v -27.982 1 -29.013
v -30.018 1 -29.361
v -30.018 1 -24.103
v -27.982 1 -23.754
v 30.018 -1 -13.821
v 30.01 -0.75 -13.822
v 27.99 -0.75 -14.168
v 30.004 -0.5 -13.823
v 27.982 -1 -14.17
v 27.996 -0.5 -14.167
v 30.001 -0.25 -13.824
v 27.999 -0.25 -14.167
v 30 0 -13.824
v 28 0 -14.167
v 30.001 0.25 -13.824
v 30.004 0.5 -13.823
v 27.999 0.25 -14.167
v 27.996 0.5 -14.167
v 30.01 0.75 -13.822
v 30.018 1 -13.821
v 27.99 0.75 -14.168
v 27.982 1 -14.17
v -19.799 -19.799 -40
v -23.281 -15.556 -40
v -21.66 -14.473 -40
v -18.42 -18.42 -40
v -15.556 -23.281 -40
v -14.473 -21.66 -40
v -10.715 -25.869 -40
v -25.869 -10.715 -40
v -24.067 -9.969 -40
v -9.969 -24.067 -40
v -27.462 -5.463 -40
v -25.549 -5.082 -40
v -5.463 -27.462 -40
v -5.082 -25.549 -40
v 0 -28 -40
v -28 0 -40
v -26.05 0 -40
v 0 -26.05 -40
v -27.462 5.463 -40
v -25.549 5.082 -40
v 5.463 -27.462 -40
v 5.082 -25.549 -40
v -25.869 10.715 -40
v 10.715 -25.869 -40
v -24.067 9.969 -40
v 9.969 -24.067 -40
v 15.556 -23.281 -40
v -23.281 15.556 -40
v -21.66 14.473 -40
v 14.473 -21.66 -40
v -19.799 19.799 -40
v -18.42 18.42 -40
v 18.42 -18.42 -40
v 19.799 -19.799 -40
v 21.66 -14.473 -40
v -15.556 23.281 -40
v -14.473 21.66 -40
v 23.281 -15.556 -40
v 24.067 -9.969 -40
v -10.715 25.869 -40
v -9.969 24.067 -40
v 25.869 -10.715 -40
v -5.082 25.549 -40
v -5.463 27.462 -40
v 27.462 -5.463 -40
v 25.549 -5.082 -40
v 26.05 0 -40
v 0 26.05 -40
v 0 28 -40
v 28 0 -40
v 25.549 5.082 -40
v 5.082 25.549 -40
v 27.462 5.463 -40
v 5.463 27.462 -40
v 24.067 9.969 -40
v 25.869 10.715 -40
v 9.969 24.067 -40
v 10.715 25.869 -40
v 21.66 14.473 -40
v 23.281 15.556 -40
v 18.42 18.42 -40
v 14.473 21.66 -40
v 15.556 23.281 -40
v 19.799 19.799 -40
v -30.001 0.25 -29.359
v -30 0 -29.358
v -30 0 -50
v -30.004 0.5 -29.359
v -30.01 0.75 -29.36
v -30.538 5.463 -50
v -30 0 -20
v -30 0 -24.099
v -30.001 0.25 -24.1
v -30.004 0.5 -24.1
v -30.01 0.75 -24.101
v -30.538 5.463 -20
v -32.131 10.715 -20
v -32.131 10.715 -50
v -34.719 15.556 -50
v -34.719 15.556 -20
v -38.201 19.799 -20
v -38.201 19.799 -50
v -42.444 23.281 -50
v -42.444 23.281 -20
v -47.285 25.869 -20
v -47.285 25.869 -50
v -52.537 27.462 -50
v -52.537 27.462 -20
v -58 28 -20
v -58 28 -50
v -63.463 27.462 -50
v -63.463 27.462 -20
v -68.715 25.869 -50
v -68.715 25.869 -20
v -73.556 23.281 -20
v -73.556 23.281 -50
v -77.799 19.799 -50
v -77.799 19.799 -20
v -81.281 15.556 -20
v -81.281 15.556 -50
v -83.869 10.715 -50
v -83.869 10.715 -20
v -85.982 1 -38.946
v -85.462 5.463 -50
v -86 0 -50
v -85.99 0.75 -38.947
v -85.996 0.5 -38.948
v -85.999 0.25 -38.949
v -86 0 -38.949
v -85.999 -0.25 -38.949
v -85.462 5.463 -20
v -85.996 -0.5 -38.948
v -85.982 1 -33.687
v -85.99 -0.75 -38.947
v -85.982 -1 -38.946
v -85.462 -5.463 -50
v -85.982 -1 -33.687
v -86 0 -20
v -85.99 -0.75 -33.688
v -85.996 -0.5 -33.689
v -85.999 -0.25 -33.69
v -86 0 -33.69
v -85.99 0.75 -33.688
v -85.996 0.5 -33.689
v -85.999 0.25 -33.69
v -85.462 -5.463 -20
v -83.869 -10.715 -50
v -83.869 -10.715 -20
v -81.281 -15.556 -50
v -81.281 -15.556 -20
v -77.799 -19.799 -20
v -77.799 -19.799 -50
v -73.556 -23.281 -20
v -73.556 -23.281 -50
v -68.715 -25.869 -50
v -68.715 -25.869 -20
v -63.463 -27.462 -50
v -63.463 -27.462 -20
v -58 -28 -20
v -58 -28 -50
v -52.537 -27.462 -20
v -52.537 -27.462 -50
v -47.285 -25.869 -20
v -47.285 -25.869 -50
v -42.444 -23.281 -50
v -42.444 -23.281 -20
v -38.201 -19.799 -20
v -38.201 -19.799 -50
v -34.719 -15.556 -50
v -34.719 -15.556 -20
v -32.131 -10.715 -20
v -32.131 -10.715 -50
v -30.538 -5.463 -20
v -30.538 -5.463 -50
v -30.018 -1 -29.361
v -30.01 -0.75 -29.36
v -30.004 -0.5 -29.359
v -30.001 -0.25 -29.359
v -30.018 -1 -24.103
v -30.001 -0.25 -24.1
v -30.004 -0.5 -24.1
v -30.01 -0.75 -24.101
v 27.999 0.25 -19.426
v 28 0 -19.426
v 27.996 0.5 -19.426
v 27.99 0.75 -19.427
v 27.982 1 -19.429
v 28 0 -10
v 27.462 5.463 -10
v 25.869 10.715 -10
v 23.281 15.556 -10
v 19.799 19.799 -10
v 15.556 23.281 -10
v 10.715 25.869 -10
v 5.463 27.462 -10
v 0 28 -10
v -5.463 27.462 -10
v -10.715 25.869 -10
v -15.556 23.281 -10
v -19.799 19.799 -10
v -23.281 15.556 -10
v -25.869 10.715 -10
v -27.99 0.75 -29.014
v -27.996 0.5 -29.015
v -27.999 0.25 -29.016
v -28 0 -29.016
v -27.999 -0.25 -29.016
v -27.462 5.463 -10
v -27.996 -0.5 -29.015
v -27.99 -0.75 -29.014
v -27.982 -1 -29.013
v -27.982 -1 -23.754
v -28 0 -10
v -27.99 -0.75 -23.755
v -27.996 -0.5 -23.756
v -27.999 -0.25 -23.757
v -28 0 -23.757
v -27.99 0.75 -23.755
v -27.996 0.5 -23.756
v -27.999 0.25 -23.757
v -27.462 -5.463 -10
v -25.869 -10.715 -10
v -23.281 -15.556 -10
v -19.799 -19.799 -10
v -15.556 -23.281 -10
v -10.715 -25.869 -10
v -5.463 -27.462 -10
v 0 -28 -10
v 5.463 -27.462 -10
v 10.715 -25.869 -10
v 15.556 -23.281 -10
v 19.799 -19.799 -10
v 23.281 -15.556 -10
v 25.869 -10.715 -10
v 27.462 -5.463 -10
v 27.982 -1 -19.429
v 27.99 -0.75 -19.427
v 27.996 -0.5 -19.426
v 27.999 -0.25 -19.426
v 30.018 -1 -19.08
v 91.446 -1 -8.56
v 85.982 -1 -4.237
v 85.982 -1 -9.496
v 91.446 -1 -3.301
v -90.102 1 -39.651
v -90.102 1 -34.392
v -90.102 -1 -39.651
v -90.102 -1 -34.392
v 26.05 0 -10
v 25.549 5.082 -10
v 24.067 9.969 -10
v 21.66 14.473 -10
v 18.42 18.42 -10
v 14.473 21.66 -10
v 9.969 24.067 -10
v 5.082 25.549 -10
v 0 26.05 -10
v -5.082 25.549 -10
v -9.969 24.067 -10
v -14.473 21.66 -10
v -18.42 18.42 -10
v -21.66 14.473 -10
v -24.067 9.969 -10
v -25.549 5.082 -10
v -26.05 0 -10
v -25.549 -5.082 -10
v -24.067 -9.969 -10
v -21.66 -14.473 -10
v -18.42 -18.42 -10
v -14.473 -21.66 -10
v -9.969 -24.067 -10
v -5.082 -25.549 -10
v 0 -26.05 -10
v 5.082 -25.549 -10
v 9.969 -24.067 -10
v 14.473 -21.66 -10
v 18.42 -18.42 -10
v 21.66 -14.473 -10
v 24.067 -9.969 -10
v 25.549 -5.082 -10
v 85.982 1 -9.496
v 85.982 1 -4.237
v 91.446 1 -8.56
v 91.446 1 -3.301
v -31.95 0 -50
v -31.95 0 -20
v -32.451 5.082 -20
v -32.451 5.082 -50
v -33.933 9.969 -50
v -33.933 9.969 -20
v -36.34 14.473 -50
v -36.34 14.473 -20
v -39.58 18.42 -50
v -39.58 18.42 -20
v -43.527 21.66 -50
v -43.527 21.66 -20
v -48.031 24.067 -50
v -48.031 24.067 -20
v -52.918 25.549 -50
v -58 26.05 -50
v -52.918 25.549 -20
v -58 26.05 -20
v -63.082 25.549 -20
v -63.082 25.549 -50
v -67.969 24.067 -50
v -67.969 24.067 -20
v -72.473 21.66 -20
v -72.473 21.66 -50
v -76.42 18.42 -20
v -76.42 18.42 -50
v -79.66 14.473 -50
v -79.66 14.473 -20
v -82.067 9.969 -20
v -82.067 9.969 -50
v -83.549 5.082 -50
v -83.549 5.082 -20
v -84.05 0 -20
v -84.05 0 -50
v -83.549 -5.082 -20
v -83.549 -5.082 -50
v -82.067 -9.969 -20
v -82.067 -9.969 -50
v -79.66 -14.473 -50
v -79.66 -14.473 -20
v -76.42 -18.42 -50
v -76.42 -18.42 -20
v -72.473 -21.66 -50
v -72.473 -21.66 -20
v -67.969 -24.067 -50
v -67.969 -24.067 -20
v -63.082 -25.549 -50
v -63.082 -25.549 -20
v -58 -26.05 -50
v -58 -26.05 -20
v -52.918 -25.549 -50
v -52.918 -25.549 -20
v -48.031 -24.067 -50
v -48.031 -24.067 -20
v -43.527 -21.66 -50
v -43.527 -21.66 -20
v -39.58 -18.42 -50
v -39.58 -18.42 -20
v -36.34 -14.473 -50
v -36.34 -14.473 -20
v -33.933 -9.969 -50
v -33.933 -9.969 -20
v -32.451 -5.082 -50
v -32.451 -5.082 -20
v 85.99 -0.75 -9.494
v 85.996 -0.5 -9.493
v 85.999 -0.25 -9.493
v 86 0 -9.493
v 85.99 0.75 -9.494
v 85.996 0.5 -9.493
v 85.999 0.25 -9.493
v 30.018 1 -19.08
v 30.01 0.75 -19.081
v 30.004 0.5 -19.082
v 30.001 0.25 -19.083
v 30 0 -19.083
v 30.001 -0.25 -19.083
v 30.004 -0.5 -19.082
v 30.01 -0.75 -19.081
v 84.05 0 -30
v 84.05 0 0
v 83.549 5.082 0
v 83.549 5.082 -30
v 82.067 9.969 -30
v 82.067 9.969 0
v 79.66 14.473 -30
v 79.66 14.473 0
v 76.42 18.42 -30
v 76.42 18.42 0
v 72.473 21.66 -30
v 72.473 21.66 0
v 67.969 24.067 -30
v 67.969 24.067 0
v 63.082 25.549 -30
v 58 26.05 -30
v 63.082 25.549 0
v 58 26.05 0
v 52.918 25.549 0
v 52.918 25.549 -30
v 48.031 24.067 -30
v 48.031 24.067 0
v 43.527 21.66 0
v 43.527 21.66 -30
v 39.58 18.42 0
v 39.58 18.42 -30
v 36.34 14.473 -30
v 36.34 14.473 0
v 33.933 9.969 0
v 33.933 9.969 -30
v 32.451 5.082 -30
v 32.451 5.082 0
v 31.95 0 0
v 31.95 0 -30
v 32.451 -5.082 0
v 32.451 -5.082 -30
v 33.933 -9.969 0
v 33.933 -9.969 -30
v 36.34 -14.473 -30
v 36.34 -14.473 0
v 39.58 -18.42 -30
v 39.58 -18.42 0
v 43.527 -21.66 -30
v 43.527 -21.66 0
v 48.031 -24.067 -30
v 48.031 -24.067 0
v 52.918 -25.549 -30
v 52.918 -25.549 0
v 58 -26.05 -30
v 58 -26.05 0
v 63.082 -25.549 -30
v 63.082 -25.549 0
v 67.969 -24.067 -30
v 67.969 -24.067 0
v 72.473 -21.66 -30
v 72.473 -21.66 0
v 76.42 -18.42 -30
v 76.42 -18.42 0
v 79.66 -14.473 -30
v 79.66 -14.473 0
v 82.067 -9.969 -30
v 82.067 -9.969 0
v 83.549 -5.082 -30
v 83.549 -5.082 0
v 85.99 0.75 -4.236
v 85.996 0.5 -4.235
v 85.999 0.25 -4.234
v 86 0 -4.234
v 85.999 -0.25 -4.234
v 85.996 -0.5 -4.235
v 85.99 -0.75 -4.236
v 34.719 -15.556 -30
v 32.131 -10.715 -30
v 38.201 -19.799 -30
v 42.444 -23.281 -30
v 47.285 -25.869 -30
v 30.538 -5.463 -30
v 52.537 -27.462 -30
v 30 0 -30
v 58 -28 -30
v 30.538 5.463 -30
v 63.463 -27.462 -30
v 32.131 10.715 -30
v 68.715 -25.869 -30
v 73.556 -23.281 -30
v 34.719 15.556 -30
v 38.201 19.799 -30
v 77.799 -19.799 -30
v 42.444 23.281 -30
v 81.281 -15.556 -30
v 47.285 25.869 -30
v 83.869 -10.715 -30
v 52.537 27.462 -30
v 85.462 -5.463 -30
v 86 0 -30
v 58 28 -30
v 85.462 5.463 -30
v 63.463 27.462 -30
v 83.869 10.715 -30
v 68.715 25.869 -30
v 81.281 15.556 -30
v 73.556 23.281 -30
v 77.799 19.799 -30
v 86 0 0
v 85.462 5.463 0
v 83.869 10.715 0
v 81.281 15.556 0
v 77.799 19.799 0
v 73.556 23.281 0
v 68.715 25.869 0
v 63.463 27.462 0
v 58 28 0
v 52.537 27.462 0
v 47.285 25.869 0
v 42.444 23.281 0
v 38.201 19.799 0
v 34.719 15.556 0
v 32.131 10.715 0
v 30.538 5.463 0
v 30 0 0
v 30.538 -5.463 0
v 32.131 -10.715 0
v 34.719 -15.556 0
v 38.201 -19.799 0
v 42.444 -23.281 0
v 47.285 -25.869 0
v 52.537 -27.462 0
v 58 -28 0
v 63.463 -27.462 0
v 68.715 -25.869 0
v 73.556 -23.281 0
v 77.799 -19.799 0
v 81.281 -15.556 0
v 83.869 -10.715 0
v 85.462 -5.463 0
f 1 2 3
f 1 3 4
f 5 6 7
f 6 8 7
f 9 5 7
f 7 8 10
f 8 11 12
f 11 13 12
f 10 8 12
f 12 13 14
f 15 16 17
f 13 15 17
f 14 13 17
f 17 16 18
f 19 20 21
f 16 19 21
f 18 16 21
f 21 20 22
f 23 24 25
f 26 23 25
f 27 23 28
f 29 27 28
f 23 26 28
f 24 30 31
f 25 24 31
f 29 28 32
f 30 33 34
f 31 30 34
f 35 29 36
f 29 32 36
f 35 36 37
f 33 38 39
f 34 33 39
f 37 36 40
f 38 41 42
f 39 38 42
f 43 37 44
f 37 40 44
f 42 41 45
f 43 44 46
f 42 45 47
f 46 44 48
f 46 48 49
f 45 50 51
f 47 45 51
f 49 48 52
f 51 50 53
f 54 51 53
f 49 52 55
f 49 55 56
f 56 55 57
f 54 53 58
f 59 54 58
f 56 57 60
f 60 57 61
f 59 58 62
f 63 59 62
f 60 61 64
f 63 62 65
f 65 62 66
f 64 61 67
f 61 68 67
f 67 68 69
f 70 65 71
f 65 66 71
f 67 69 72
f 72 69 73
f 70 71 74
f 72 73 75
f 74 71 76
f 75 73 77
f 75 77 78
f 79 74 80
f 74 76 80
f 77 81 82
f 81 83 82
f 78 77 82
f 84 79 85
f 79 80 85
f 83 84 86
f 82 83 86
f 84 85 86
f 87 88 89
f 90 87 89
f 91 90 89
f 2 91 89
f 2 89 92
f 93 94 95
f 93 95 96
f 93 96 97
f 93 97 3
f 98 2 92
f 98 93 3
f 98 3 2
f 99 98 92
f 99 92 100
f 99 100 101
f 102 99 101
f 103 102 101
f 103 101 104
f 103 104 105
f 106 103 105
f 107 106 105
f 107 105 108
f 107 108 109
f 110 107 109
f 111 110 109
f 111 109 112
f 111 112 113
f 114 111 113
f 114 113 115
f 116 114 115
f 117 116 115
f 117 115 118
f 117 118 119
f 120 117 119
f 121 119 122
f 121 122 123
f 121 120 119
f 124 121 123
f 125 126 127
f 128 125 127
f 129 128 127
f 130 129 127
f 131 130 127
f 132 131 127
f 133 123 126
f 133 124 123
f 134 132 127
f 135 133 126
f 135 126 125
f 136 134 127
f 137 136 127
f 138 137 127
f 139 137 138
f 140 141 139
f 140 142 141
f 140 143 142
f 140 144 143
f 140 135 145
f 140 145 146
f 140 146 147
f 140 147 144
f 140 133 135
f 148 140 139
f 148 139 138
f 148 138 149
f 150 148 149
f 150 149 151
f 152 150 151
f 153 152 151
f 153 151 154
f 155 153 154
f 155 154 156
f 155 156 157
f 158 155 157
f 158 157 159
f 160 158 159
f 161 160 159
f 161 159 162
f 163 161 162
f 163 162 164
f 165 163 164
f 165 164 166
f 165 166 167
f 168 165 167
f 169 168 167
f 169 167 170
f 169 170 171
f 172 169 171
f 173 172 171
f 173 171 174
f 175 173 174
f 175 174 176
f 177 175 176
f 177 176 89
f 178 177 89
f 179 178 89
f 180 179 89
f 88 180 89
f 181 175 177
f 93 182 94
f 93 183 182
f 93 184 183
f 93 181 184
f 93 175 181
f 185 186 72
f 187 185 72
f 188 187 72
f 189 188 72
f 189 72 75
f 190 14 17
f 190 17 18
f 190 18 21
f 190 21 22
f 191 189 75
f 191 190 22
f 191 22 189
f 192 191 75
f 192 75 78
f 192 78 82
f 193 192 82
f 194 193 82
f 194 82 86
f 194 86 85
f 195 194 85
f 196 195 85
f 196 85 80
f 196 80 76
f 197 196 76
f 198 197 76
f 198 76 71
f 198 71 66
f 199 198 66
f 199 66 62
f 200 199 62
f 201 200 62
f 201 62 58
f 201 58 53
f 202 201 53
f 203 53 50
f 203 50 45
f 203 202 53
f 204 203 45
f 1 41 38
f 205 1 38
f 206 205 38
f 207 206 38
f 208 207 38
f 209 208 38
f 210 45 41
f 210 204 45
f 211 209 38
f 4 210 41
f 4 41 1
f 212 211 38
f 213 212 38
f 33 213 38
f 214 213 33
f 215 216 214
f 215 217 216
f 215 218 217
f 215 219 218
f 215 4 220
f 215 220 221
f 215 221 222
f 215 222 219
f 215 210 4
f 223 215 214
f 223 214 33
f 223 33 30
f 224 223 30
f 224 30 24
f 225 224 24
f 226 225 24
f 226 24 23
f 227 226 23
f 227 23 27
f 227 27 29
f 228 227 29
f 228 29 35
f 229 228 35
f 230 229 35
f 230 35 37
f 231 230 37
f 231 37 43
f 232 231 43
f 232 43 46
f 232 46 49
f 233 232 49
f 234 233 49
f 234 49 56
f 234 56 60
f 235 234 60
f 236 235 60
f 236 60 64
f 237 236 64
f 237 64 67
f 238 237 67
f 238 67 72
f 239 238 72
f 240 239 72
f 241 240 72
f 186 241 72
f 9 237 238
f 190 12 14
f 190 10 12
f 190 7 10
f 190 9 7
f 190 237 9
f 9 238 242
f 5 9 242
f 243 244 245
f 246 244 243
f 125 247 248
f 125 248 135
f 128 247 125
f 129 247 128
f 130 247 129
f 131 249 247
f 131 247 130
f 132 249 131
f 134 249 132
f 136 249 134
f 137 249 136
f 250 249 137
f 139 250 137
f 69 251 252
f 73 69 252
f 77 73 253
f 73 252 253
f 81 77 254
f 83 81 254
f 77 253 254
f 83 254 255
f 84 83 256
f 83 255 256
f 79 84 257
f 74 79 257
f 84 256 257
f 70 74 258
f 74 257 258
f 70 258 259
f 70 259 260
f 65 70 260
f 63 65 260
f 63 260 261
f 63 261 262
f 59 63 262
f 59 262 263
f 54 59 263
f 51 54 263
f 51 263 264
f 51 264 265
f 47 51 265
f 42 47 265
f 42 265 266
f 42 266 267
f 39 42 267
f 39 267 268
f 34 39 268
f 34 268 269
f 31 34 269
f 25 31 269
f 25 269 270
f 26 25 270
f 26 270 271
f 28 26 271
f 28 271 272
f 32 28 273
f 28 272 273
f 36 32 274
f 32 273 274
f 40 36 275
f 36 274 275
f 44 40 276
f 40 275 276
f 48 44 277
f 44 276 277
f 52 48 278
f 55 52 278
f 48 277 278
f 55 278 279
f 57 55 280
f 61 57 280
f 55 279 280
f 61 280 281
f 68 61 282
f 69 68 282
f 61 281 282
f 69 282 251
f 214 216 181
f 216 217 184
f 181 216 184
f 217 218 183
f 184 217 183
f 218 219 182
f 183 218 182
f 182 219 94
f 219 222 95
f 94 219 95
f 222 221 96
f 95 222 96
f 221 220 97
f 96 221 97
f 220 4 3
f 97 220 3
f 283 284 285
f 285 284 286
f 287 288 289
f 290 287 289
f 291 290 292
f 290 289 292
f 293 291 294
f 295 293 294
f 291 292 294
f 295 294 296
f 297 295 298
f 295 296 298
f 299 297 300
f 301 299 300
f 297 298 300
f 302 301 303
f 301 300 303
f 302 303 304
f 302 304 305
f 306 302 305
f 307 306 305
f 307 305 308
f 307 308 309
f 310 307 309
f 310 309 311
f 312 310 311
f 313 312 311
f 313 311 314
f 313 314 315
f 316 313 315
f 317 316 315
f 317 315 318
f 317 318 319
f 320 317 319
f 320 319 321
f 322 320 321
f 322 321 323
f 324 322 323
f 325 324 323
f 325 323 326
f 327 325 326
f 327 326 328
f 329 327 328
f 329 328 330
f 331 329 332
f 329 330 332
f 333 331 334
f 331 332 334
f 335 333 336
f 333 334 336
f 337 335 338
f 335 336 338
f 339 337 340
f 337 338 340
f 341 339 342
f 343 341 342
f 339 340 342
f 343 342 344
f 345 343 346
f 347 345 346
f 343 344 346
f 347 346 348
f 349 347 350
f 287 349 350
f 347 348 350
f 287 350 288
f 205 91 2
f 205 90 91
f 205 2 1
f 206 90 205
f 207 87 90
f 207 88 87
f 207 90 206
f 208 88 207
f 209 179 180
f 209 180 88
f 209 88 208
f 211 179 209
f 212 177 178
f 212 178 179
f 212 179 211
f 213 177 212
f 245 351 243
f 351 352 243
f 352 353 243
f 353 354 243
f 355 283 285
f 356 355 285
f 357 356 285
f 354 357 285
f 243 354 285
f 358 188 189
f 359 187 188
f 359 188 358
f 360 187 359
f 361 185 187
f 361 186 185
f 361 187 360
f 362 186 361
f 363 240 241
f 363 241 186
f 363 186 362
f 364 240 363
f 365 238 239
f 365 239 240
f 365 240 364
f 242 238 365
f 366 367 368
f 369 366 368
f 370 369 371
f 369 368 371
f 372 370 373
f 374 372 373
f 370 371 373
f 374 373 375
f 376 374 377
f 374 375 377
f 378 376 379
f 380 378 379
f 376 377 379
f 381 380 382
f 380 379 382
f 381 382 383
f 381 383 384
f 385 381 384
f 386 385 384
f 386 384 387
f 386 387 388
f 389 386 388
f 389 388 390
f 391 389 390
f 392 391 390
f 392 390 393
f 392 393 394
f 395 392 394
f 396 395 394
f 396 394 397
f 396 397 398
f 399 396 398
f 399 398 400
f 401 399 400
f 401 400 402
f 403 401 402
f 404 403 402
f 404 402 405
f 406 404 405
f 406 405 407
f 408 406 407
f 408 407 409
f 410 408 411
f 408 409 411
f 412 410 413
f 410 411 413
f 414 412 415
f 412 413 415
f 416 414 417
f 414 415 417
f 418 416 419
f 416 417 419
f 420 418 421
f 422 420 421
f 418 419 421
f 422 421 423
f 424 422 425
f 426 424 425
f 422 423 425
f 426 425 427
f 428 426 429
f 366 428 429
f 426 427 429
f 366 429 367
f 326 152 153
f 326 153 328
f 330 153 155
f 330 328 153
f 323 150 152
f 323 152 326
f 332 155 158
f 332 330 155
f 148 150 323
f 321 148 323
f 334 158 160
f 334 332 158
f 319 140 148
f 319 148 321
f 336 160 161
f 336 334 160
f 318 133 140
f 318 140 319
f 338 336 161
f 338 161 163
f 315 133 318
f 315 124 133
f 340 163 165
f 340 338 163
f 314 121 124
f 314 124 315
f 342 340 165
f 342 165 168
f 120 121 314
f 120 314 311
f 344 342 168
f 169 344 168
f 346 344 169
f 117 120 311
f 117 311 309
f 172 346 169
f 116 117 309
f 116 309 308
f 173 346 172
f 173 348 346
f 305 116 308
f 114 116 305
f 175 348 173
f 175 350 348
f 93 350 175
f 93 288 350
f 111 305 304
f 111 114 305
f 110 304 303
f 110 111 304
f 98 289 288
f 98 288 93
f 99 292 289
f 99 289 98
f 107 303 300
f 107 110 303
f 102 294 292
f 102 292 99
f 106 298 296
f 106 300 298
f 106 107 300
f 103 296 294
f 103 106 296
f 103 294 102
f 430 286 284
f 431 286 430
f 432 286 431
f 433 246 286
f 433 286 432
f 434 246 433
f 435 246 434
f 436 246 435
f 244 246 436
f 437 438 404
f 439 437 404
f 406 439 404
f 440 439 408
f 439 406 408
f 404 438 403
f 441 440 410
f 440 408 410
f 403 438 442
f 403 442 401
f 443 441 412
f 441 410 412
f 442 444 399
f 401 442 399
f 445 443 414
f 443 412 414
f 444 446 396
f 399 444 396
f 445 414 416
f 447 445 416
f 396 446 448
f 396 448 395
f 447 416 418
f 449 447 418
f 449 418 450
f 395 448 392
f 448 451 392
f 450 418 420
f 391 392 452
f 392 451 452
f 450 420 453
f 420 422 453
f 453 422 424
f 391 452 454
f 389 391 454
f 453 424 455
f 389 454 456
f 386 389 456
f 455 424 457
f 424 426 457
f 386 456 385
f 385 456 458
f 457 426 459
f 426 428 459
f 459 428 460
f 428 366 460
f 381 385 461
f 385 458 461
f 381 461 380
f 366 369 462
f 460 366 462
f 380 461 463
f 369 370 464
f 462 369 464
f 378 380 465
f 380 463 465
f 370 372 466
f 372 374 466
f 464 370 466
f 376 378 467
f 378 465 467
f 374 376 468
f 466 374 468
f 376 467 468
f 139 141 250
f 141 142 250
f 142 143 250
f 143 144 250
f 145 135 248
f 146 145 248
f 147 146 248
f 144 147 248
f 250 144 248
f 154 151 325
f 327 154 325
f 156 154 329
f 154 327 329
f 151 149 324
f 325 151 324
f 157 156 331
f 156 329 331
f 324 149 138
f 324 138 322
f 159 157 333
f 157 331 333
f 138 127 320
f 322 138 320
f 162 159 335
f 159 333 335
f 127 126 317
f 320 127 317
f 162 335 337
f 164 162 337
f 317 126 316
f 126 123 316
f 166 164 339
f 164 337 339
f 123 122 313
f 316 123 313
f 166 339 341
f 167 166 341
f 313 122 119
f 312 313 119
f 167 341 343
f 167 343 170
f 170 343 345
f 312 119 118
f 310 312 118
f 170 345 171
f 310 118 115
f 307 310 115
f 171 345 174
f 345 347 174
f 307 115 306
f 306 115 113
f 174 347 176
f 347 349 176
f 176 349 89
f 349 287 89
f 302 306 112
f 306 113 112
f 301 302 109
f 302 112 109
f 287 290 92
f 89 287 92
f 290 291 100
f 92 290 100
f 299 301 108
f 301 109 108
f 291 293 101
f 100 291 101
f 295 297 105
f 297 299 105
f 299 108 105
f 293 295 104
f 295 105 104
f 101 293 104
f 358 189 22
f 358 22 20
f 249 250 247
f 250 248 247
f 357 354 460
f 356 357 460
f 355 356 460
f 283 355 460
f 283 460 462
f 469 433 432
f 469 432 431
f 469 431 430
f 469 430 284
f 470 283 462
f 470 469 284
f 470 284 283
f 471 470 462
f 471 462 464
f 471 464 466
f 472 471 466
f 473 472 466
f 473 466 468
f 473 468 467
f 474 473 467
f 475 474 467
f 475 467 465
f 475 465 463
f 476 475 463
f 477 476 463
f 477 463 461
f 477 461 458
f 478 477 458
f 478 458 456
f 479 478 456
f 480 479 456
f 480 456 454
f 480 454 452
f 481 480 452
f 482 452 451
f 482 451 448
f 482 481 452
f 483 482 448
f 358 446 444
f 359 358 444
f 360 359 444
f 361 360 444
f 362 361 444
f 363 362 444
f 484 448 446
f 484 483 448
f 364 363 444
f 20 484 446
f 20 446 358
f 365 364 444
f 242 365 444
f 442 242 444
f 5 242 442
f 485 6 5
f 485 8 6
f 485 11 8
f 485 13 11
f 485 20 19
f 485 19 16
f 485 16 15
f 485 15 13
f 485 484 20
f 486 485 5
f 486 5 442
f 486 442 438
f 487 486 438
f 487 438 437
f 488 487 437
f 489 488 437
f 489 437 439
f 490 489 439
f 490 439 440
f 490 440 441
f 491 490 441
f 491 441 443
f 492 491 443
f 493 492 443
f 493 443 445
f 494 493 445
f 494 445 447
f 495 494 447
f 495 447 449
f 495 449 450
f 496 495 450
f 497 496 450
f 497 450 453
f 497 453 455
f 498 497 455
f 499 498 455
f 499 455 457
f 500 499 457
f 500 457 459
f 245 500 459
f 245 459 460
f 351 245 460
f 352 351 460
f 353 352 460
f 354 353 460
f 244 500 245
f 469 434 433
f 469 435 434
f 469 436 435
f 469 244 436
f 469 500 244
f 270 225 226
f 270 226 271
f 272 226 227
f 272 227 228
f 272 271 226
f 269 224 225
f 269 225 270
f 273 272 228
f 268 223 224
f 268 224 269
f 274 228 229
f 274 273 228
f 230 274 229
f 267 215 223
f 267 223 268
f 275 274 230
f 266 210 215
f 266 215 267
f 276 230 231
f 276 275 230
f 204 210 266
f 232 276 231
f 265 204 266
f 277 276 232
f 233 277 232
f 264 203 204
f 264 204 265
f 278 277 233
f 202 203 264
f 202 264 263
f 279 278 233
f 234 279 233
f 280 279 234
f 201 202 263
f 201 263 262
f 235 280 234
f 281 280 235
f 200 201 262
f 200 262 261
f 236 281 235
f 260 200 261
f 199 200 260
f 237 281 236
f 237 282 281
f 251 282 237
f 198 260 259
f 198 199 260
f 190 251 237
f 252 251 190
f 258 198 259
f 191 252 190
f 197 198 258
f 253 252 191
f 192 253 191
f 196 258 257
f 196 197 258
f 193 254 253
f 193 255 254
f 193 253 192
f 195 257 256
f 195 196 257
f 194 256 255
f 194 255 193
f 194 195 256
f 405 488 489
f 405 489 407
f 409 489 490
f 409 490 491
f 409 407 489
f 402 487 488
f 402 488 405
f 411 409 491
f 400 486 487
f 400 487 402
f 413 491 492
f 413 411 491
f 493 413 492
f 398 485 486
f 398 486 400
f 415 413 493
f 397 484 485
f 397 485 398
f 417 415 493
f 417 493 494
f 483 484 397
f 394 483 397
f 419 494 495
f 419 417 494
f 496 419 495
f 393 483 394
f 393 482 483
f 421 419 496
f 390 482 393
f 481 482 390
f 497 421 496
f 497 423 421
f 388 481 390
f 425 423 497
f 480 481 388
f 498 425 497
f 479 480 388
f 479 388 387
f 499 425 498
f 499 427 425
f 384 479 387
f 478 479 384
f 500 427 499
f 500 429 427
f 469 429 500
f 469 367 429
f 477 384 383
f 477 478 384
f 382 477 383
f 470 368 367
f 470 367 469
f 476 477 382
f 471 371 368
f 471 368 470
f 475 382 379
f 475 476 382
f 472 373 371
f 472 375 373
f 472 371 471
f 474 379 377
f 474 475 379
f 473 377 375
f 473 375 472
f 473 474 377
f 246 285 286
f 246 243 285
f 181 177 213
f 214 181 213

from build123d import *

# Parameters (mm, degrees)
F0_R          = 28
F0_R_2        = 26.05
F1_DEPTH      = 30
F2_START      = -10
F2_DEPTH      = 30
F3_START      = -20
F3_DEPTH      = 30
F5_DEPTH      = 1
F5_DEPTH_BACK = 1
F6_DEPTH      = 50
F7_DEPTH      = 150.7
F8_DEPTH      = 50


with BuildPart() as f1:
    # F0 (on Top) → F1 (new body)
    with BuildSketch(Plane.XY):
        with Locations((58, 0)):
            Circle(F0_R)
        with Locations((58, 0)):
            Circle(F0_R_2, mode=Mode.SUBTRACT)
        with Locations((58, 0)):
            Circle(F0_R_2)
    extrude(amount=-F1_DEPTH)



with BuildPart() as f2:
    # F0 (on Top) → F2 (new body)
    with BuildSketch(Plane.XY.offset(F2_START)):
        Circle(F0_R)
        Circle(F0_R_2, mode=Mode.SUBTRACT)
        Circle(F0_R_2)
    extrude(amount=-F2_DEPTH)


with BuildPart() as f3:
    # F0 (on Top) → F3 (new body)
    with BuildSketch(Plane.XY.offset(F3_START)):
        with Locations((-58, 0)):
            Circle(F0_R)
        with Locations((-58, 0)):
            Circle(F0_R_2, mode=Mode.SUBTRACT)
        with Locations((-58, 0)):
            Circle(F0_R_2)
    extrude(amount=-F3_DEPTH)


with BuildPart() as f1_1:
    add(f1.part)

    add(f2.part)  # F5 merges F2

    add(f3.part)  # F5 merges F3
    # F4 (on Front) → F5 (join, two sides)
    with BuildSketch(Plane.XZ) as f5_sk:
        Polygon((91.4459181696, -3.3011357271), (-90.1017620827, -34.3922948223), (-90.1017620827, -39.6512281582), (91.4459181696, -8.560069063), align=None)
    extrude(amount=F5_DEPTH)
    extrude(f5_sk.sketch, amount=-F5_DEPTH_BACK)

    # F0 (on Top) → F6 (cut)
    with BuildSketch(Plane.XY):
        with Locations((-58, 0)):
            Circle(F0_R_2)
    extrude(amount=-F6_DEPTH, mode=Mode.SUBTRACT)

    # F0 (on Top) → F7 (cut)
    with BuildSketch(Plane.XY):
        Circle(F0_R_2)
    extrude(amount=-F7_DEPTH, mode=Mode.SUBTRACT)

    # F0 (on Top) → F8 (cut)
    with BuildSketch(Plane.XY):
        with Locations((58, 0)):
            Circle(F0_R_2)
    extrude(amount=-F8_DEPTH, mode=Mode.SUBTRACT)


solid = f1_1.part
